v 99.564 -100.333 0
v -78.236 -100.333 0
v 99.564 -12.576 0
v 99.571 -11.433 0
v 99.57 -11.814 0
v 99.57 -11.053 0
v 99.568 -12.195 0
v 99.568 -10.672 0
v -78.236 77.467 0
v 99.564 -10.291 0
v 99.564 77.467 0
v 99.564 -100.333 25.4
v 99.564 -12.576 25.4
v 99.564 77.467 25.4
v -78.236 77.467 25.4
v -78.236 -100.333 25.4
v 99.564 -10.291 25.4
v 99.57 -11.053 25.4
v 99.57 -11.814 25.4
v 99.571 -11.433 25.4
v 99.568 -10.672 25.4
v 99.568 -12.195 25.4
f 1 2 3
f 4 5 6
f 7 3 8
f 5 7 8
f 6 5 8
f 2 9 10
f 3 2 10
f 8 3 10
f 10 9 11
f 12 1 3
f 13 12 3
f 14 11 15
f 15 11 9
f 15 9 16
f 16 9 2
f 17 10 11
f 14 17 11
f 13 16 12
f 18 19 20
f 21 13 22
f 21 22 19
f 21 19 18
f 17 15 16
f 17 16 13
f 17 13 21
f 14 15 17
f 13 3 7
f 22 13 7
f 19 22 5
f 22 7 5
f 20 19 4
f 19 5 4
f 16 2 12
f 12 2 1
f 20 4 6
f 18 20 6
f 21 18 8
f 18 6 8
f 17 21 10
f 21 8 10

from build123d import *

# Parameters (mm, degrees)
F1_DEPTH = 25.4


with BuildPart() as f1:
    # F0 (on Top) → F1 (new body)
    with BuildSketch(Plane.XY):
        with BuildLine():
            Line((10.6712168168, 77.4665550828), (-78.2361279793, 77.4665550828))
            Line((-78.2361279793, 77.4665550828), (-78.2361279793, -11.4334449172))
            Line((-78.2361279793, -11.4334449172), (-78.2287839368, -11.4334449172))
            ThreePointArc((-78.2287839368, -11.4334449172), (-52.1905765178, 51.4283481967), (10.6712168168, 77.4665550828))
        make_face()
        with BuildLine():
            Line((99.5638720207, 77.4665550828), (10.6712168168, 77.4665550828))
            ThreePointArc((10.6712168168, 77.4665550828), (73.1277042953, 51.8310560111), (99.5638720207, -10.29076525))
            Line((99.5638720207, -10.29076525), (99.5638720207, 77.4665550828))
        make_face()
        with BuildLine():
            ThreePointArc((99.5638720207, -10.29076525), (73.1277042953, 51.8310560111), (10.6712168168, 77.4665550828))
            ThreePointArc((10.6712168168, 77.4665550828), (-52.1905765178, 51.4283481967), (-78.2287839368, -11.4334449172))
            ThreePointArc((-78.2287839368, -11.4334449172), (-52.1905767843, -74.2952377647), (10.6712160632, -100.3334449172))
            ThreePointArc((10.6712160632, -100.3334449172), (73.1277040272, -74.6979461103), (99.5638720207, -12.5761245844))
            Line((99.5638720207, -12.5761245844), (99.5638720207, -10.29076525))
        make_face()
        with BuildLine():
            Line((-78.2287839368, -11.4334449172), (-78.2361279793, -11.4334449172))
            Line((-78.2361279793, -11.4334449172), (-78.2361279793, -100.3334449172))
            Line((-78.2361279793, -100.3334449172), (10.6712160632, -100.3334449172))
            ThreePointArc((10.6712160632, -100.3334449172), (-52.1905767843, -74.2952377647), (-78.2287839368, -11.4334449172))
        make_face()
        with BuildLine():
            ThreePointArc((99.5712160632, -11.4334449172), (99.5693800336, -10.8620932836), (99.5638720207, -10.29076525))
            Line((99.5638720207, -10.29076525), (99.5638720207, -12.5761245844))
            ThreePointArc((99.5638720207, -12.5761245844), (99.5693800336, -12.0047965508), (99.5712160632, -11.4334449172))
        make_face()
        with BuildLine():
            Line((99.5638720207, -100.3334449172), (99.5638720207, -12.5761245844))
            ThreePointArc((99.5638720207, -12.5761245844), (73.1277040272, -74.6979461103), (10.6712160632, -100.3334449172))
            Line((10.6712160632, -100.3334449172), (99.5638720207, -100.3334449172))
        make_face()
    extrude(amount=F1_DEPTH)


solid = f1.part
